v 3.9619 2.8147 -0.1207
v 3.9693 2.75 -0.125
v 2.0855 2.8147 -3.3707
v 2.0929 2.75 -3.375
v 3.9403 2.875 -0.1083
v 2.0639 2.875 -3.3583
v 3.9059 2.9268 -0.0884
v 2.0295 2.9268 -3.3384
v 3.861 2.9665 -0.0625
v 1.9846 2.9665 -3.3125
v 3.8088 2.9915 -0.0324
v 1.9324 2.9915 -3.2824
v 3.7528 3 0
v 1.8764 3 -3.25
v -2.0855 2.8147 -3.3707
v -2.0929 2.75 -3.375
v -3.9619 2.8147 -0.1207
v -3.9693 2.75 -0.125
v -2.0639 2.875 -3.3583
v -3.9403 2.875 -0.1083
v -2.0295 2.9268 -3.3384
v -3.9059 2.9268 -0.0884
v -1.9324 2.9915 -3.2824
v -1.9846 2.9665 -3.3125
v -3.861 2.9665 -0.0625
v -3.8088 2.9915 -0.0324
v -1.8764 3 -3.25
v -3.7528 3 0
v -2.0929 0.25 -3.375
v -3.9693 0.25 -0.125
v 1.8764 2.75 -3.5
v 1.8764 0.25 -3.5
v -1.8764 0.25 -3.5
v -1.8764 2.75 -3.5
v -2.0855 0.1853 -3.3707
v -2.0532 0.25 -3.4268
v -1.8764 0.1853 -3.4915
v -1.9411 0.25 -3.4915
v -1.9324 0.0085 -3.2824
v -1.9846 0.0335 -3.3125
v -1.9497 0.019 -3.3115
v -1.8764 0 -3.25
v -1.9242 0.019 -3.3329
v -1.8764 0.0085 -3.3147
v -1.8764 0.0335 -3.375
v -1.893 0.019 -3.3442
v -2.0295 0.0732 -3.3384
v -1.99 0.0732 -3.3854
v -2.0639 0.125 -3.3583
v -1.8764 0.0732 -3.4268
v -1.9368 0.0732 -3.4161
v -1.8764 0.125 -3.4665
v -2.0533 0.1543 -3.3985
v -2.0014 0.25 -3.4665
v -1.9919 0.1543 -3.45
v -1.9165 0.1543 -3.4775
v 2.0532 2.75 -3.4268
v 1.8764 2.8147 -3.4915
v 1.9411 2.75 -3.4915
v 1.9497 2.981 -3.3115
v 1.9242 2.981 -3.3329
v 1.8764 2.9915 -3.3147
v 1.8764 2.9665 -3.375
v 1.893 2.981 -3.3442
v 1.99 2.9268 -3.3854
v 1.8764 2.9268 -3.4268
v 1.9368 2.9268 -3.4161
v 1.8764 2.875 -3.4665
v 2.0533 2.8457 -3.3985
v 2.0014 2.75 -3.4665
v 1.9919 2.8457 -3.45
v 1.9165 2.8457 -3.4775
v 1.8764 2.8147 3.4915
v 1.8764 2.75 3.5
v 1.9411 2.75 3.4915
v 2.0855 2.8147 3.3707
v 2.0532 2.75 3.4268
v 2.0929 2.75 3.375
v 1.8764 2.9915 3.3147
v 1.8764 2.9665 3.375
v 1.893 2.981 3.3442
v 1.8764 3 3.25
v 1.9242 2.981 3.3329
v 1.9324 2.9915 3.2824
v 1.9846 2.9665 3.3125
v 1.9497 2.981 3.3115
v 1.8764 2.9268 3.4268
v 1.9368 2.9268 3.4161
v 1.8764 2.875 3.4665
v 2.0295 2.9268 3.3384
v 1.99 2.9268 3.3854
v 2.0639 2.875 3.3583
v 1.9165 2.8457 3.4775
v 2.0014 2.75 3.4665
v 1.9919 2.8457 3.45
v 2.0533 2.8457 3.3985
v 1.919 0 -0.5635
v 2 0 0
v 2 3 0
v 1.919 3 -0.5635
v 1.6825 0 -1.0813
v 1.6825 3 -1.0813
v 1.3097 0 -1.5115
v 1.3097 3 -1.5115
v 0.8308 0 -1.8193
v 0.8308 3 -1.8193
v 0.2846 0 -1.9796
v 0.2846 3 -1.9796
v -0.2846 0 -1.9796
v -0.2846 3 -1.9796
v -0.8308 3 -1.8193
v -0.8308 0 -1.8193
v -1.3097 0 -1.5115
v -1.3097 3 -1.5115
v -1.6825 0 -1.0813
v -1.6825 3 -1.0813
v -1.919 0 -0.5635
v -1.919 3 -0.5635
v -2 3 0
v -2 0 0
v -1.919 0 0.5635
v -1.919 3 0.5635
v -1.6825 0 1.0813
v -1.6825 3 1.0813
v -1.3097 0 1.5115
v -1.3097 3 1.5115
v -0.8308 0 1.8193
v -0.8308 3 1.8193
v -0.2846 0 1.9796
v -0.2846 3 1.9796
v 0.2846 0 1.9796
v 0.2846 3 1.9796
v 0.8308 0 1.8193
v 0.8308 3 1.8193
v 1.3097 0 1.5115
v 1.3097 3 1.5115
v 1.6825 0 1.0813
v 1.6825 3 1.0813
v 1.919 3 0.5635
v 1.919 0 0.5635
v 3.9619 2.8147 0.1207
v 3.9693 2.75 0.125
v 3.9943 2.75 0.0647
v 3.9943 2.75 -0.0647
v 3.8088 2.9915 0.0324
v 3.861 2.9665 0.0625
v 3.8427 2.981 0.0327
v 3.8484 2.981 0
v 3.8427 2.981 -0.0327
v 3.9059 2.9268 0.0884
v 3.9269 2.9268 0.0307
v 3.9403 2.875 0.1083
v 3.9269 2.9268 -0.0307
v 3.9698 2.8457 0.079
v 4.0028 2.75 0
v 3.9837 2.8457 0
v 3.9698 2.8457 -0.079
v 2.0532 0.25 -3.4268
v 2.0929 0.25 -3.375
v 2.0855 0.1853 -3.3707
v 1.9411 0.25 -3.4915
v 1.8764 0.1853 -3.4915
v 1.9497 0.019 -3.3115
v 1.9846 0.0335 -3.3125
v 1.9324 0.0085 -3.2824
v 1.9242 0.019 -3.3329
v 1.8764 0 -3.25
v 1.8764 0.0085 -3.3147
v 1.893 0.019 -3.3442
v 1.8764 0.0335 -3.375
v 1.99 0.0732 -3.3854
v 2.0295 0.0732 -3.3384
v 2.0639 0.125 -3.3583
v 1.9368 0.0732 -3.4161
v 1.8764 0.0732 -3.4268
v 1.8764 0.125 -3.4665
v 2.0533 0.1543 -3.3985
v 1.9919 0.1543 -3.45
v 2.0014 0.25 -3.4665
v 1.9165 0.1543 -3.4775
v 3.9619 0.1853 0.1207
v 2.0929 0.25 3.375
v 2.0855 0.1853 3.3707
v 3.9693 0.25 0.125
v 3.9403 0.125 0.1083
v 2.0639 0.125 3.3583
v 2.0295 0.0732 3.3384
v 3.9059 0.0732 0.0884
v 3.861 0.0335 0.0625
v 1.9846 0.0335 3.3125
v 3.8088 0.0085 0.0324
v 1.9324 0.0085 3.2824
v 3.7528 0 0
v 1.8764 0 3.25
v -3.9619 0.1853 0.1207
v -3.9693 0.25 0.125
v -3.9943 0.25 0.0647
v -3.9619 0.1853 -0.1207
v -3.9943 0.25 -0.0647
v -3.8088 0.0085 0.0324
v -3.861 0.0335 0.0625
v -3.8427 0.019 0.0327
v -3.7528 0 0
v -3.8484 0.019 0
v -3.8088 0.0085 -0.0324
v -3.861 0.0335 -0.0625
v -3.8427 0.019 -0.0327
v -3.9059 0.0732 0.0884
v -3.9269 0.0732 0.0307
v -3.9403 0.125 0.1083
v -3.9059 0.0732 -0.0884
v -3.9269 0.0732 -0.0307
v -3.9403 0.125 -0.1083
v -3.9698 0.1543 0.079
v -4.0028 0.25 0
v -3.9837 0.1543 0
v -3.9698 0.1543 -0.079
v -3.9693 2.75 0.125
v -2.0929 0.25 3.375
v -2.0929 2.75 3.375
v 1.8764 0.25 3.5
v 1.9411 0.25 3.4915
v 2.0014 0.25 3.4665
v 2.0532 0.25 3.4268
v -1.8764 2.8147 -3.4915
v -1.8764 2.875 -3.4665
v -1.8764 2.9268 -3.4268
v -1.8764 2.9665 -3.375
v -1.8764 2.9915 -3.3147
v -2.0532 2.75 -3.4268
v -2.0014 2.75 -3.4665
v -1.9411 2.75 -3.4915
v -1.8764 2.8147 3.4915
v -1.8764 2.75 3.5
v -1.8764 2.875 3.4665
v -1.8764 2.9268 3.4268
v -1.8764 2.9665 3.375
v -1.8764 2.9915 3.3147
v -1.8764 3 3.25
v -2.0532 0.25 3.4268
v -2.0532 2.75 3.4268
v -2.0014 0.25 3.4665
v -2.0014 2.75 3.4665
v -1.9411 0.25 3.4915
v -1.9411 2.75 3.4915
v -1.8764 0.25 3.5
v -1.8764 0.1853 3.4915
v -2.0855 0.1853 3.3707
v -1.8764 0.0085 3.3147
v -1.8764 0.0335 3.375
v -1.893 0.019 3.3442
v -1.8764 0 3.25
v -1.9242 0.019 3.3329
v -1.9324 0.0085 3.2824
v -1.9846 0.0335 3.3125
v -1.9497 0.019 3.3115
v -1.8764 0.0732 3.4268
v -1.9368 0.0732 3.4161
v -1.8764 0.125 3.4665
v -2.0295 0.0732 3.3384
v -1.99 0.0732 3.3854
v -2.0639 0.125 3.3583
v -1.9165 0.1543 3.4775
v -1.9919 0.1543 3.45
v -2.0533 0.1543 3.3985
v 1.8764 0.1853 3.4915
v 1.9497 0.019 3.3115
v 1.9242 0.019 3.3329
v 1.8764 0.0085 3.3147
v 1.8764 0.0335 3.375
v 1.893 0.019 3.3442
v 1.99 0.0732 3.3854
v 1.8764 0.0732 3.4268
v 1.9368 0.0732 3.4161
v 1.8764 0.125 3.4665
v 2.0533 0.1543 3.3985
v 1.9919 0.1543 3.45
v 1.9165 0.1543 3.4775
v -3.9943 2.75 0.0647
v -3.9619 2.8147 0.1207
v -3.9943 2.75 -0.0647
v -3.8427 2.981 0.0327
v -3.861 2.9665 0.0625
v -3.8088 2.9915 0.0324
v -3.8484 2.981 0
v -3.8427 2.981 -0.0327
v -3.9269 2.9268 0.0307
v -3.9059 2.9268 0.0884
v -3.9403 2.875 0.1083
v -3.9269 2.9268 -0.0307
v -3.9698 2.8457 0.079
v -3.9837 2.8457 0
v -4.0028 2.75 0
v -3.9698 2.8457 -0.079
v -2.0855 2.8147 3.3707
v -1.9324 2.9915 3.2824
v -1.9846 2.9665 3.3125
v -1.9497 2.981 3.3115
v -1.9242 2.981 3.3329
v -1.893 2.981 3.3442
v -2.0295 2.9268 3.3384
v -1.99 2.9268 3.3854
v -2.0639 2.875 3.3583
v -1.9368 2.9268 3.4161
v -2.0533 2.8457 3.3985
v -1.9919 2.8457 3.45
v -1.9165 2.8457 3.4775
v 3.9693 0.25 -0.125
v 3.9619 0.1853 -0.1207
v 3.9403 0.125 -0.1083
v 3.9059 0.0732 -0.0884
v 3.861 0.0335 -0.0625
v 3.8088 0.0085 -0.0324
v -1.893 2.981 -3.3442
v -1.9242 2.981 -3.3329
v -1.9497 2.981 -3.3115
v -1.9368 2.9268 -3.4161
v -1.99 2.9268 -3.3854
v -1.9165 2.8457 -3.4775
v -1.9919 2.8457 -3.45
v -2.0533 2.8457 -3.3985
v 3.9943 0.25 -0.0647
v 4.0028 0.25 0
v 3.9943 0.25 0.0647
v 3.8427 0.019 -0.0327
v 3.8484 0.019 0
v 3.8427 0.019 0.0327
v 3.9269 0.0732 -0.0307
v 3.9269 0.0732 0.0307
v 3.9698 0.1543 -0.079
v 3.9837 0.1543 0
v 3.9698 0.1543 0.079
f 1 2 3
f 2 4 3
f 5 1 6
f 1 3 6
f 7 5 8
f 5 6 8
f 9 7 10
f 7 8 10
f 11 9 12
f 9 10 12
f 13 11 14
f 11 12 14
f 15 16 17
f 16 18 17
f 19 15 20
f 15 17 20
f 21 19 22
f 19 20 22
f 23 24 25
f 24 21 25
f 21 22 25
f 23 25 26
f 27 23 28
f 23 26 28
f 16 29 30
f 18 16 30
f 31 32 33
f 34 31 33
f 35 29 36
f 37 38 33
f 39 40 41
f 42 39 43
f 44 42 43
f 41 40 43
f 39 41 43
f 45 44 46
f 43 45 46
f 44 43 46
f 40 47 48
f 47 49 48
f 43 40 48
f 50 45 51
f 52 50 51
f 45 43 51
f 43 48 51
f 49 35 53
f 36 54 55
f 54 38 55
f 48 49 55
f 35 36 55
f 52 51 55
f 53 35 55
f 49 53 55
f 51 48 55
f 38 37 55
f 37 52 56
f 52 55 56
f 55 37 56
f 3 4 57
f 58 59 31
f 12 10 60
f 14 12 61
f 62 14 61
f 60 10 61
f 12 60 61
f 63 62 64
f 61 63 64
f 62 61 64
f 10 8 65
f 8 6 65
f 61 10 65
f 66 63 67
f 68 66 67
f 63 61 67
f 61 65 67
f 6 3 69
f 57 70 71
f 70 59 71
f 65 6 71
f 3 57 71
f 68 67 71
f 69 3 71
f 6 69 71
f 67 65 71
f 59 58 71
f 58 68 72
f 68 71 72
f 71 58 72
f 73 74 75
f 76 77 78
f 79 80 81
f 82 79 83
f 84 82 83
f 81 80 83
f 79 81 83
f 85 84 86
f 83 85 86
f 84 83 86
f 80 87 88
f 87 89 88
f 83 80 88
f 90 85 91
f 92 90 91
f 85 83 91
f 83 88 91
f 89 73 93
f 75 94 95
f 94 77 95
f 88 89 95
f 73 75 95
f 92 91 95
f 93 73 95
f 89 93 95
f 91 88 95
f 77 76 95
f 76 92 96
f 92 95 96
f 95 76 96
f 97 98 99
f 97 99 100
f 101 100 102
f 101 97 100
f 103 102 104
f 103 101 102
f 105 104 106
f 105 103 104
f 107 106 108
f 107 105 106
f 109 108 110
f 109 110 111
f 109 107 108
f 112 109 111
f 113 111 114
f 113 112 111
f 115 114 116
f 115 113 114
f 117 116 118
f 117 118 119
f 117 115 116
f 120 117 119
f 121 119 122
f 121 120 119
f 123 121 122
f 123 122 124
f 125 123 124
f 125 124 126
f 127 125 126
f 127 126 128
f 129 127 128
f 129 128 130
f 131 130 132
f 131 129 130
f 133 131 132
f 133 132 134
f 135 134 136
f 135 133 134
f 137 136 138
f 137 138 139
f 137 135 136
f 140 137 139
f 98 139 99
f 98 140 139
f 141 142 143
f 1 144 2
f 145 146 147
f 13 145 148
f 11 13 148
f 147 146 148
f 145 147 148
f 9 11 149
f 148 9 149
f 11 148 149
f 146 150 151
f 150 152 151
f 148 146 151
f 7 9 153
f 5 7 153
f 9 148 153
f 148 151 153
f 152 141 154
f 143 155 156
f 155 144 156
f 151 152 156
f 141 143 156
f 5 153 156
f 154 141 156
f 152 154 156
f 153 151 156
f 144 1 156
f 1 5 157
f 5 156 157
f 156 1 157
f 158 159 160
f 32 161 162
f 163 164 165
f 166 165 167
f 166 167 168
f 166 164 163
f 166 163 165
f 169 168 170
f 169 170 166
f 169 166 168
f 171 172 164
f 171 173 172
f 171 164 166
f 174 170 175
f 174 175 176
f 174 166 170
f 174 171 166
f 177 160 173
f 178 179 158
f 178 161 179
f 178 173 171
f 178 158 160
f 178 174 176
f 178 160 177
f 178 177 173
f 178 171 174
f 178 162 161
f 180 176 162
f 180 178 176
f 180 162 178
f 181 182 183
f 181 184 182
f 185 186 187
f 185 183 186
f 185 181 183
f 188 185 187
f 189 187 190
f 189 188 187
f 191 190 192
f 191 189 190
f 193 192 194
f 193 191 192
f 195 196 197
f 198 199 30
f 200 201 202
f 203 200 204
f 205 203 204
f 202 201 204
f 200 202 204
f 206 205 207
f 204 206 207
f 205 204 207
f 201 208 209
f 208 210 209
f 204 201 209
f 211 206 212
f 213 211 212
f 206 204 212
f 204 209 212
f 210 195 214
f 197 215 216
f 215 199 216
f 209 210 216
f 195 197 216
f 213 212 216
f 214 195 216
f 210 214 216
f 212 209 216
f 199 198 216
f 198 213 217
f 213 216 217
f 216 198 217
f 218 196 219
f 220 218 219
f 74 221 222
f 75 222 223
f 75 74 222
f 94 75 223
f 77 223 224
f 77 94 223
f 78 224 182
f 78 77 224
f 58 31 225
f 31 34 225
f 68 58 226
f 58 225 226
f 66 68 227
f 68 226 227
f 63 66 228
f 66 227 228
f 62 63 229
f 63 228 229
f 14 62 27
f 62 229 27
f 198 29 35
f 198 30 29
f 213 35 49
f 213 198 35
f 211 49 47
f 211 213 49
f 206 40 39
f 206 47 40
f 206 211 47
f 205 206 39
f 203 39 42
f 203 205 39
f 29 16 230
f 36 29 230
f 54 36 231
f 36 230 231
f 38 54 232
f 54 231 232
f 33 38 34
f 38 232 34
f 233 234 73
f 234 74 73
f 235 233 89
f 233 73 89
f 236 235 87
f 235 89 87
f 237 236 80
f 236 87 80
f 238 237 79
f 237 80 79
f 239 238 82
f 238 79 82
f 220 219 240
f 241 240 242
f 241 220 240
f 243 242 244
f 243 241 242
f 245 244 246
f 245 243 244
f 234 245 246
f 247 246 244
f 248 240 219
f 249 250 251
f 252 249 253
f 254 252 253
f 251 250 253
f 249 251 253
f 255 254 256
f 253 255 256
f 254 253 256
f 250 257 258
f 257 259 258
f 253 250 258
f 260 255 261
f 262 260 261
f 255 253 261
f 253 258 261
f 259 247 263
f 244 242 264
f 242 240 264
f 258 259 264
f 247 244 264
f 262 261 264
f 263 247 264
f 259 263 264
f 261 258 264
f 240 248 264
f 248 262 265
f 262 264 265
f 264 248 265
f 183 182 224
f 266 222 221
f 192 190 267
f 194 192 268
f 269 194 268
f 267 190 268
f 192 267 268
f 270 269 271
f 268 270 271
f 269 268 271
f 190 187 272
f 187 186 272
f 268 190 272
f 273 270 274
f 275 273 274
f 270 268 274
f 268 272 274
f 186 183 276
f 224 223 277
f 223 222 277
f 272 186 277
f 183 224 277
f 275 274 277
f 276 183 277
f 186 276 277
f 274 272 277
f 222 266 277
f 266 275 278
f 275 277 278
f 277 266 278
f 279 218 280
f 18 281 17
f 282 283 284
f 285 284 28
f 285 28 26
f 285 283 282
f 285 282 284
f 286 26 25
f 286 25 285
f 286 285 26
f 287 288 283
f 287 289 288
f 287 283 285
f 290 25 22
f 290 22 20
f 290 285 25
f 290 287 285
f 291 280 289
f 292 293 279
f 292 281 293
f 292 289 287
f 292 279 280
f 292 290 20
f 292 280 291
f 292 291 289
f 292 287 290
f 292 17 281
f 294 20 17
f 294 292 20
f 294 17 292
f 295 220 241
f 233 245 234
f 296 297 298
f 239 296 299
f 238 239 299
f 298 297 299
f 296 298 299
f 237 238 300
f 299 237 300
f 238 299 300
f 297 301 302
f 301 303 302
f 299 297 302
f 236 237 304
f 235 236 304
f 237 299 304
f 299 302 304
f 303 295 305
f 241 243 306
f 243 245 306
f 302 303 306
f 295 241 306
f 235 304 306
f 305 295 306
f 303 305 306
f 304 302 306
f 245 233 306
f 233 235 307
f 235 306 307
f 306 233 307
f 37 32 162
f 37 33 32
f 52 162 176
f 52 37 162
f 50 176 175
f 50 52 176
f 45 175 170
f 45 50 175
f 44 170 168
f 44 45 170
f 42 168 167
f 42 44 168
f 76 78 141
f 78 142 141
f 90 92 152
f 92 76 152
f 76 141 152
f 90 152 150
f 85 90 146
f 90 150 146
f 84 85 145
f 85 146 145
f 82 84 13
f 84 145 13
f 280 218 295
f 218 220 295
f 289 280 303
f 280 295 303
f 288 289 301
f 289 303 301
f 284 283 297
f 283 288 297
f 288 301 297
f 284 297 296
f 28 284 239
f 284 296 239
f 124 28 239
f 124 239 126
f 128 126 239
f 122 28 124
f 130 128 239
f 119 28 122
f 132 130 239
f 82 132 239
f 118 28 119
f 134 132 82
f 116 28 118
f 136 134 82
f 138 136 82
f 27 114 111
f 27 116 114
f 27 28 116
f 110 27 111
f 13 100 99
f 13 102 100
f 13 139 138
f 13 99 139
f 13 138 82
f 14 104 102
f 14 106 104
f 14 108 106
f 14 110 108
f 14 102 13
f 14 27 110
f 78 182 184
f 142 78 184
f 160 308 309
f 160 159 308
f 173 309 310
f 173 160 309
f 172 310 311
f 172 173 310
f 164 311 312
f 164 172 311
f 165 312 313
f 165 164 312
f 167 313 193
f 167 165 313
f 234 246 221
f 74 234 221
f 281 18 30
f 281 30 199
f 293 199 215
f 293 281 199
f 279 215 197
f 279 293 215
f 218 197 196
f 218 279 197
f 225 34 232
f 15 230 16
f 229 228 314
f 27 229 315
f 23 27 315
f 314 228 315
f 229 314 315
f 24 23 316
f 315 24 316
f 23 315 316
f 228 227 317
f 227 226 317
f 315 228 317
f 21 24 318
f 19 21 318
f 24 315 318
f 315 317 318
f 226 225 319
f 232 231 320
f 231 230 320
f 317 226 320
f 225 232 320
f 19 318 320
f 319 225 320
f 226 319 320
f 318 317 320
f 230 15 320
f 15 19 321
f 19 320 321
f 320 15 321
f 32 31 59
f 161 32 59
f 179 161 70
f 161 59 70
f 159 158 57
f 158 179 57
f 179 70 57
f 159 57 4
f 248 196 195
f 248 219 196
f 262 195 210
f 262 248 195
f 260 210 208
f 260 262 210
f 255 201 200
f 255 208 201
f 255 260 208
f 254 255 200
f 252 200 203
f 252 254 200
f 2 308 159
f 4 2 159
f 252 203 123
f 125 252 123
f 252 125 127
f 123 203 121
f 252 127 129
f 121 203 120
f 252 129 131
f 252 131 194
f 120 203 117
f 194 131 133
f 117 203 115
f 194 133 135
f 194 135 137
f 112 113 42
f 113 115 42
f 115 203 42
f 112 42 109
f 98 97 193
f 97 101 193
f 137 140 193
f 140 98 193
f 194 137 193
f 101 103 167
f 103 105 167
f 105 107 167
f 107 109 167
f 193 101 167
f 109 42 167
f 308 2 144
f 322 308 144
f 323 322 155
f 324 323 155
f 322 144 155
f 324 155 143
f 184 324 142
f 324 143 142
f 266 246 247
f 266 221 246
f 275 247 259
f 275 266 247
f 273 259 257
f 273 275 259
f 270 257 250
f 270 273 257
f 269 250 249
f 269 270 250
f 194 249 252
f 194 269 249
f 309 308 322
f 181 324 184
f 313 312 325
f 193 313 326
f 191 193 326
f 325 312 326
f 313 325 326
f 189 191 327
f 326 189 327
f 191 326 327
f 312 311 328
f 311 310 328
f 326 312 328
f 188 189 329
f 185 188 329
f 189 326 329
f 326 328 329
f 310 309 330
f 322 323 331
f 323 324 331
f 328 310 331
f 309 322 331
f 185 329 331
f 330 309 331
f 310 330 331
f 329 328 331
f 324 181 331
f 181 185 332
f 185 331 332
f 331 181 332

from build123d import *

# Parameters (mm, degrees)
SKETCH1_R           = 2
BOSS_EXTRUDE1_DEPTH = 3
FILLET1_R           = 0.25


with BuildPart() as part:
    # Sketch1 → Boss-Extrude1 (new body)
    with BuildSketch(Plane(origin=(0, 0, 0), x_dir=(1, 0, 0), z_dir=(0, 1, 0))):
        Polygon((-2.020725942, 3.5), (-4.041451884, 0), (-2.020725942, -3.5), (2.020725942, -3.5), (4.041451884, 0), (2.020725942, 3.5), align=None)
        Circle(SKETCH1_R, mode=Mode.SUBTRACT)
    extrude(amount=BOSS_EXTRUDE1_DEPTH)

    # Fillet1
    fillet1_edges = [part.edges().sort_by_distance(p)[0] for p in [
        (2.020725942, 1.5, -3.5),
        (4.041451884, 1.5, 0),
        (2.020725942, 1.5, 3.5),
        (-2.020725942, 1.5, 3.5),
        (-4.041451884, 1.5, 0),
        (-2.020725942, 1.5, -3.5),
        (-3.031088913, 3, 1.75),
        (0, 3, 3.5),
        (3.031088913, 3, 1.75),
        (3.031088913, 3, -1.75),
        (0, 3, -3.5),
        (3.031088913, 0, -1.75),
        (3.031088913, 0, 1.75),
        (0, 0, 3.5),
        (-3.031088913, 0, 1.75),
        (-3.031088913, 0, -1.75),
        (0, 0, -3.5),
        (-3.031088913, 3, -1.75),
    ]]
    fillet(fillet1_edges, radius=FILLET1_R)


solid = part.part
